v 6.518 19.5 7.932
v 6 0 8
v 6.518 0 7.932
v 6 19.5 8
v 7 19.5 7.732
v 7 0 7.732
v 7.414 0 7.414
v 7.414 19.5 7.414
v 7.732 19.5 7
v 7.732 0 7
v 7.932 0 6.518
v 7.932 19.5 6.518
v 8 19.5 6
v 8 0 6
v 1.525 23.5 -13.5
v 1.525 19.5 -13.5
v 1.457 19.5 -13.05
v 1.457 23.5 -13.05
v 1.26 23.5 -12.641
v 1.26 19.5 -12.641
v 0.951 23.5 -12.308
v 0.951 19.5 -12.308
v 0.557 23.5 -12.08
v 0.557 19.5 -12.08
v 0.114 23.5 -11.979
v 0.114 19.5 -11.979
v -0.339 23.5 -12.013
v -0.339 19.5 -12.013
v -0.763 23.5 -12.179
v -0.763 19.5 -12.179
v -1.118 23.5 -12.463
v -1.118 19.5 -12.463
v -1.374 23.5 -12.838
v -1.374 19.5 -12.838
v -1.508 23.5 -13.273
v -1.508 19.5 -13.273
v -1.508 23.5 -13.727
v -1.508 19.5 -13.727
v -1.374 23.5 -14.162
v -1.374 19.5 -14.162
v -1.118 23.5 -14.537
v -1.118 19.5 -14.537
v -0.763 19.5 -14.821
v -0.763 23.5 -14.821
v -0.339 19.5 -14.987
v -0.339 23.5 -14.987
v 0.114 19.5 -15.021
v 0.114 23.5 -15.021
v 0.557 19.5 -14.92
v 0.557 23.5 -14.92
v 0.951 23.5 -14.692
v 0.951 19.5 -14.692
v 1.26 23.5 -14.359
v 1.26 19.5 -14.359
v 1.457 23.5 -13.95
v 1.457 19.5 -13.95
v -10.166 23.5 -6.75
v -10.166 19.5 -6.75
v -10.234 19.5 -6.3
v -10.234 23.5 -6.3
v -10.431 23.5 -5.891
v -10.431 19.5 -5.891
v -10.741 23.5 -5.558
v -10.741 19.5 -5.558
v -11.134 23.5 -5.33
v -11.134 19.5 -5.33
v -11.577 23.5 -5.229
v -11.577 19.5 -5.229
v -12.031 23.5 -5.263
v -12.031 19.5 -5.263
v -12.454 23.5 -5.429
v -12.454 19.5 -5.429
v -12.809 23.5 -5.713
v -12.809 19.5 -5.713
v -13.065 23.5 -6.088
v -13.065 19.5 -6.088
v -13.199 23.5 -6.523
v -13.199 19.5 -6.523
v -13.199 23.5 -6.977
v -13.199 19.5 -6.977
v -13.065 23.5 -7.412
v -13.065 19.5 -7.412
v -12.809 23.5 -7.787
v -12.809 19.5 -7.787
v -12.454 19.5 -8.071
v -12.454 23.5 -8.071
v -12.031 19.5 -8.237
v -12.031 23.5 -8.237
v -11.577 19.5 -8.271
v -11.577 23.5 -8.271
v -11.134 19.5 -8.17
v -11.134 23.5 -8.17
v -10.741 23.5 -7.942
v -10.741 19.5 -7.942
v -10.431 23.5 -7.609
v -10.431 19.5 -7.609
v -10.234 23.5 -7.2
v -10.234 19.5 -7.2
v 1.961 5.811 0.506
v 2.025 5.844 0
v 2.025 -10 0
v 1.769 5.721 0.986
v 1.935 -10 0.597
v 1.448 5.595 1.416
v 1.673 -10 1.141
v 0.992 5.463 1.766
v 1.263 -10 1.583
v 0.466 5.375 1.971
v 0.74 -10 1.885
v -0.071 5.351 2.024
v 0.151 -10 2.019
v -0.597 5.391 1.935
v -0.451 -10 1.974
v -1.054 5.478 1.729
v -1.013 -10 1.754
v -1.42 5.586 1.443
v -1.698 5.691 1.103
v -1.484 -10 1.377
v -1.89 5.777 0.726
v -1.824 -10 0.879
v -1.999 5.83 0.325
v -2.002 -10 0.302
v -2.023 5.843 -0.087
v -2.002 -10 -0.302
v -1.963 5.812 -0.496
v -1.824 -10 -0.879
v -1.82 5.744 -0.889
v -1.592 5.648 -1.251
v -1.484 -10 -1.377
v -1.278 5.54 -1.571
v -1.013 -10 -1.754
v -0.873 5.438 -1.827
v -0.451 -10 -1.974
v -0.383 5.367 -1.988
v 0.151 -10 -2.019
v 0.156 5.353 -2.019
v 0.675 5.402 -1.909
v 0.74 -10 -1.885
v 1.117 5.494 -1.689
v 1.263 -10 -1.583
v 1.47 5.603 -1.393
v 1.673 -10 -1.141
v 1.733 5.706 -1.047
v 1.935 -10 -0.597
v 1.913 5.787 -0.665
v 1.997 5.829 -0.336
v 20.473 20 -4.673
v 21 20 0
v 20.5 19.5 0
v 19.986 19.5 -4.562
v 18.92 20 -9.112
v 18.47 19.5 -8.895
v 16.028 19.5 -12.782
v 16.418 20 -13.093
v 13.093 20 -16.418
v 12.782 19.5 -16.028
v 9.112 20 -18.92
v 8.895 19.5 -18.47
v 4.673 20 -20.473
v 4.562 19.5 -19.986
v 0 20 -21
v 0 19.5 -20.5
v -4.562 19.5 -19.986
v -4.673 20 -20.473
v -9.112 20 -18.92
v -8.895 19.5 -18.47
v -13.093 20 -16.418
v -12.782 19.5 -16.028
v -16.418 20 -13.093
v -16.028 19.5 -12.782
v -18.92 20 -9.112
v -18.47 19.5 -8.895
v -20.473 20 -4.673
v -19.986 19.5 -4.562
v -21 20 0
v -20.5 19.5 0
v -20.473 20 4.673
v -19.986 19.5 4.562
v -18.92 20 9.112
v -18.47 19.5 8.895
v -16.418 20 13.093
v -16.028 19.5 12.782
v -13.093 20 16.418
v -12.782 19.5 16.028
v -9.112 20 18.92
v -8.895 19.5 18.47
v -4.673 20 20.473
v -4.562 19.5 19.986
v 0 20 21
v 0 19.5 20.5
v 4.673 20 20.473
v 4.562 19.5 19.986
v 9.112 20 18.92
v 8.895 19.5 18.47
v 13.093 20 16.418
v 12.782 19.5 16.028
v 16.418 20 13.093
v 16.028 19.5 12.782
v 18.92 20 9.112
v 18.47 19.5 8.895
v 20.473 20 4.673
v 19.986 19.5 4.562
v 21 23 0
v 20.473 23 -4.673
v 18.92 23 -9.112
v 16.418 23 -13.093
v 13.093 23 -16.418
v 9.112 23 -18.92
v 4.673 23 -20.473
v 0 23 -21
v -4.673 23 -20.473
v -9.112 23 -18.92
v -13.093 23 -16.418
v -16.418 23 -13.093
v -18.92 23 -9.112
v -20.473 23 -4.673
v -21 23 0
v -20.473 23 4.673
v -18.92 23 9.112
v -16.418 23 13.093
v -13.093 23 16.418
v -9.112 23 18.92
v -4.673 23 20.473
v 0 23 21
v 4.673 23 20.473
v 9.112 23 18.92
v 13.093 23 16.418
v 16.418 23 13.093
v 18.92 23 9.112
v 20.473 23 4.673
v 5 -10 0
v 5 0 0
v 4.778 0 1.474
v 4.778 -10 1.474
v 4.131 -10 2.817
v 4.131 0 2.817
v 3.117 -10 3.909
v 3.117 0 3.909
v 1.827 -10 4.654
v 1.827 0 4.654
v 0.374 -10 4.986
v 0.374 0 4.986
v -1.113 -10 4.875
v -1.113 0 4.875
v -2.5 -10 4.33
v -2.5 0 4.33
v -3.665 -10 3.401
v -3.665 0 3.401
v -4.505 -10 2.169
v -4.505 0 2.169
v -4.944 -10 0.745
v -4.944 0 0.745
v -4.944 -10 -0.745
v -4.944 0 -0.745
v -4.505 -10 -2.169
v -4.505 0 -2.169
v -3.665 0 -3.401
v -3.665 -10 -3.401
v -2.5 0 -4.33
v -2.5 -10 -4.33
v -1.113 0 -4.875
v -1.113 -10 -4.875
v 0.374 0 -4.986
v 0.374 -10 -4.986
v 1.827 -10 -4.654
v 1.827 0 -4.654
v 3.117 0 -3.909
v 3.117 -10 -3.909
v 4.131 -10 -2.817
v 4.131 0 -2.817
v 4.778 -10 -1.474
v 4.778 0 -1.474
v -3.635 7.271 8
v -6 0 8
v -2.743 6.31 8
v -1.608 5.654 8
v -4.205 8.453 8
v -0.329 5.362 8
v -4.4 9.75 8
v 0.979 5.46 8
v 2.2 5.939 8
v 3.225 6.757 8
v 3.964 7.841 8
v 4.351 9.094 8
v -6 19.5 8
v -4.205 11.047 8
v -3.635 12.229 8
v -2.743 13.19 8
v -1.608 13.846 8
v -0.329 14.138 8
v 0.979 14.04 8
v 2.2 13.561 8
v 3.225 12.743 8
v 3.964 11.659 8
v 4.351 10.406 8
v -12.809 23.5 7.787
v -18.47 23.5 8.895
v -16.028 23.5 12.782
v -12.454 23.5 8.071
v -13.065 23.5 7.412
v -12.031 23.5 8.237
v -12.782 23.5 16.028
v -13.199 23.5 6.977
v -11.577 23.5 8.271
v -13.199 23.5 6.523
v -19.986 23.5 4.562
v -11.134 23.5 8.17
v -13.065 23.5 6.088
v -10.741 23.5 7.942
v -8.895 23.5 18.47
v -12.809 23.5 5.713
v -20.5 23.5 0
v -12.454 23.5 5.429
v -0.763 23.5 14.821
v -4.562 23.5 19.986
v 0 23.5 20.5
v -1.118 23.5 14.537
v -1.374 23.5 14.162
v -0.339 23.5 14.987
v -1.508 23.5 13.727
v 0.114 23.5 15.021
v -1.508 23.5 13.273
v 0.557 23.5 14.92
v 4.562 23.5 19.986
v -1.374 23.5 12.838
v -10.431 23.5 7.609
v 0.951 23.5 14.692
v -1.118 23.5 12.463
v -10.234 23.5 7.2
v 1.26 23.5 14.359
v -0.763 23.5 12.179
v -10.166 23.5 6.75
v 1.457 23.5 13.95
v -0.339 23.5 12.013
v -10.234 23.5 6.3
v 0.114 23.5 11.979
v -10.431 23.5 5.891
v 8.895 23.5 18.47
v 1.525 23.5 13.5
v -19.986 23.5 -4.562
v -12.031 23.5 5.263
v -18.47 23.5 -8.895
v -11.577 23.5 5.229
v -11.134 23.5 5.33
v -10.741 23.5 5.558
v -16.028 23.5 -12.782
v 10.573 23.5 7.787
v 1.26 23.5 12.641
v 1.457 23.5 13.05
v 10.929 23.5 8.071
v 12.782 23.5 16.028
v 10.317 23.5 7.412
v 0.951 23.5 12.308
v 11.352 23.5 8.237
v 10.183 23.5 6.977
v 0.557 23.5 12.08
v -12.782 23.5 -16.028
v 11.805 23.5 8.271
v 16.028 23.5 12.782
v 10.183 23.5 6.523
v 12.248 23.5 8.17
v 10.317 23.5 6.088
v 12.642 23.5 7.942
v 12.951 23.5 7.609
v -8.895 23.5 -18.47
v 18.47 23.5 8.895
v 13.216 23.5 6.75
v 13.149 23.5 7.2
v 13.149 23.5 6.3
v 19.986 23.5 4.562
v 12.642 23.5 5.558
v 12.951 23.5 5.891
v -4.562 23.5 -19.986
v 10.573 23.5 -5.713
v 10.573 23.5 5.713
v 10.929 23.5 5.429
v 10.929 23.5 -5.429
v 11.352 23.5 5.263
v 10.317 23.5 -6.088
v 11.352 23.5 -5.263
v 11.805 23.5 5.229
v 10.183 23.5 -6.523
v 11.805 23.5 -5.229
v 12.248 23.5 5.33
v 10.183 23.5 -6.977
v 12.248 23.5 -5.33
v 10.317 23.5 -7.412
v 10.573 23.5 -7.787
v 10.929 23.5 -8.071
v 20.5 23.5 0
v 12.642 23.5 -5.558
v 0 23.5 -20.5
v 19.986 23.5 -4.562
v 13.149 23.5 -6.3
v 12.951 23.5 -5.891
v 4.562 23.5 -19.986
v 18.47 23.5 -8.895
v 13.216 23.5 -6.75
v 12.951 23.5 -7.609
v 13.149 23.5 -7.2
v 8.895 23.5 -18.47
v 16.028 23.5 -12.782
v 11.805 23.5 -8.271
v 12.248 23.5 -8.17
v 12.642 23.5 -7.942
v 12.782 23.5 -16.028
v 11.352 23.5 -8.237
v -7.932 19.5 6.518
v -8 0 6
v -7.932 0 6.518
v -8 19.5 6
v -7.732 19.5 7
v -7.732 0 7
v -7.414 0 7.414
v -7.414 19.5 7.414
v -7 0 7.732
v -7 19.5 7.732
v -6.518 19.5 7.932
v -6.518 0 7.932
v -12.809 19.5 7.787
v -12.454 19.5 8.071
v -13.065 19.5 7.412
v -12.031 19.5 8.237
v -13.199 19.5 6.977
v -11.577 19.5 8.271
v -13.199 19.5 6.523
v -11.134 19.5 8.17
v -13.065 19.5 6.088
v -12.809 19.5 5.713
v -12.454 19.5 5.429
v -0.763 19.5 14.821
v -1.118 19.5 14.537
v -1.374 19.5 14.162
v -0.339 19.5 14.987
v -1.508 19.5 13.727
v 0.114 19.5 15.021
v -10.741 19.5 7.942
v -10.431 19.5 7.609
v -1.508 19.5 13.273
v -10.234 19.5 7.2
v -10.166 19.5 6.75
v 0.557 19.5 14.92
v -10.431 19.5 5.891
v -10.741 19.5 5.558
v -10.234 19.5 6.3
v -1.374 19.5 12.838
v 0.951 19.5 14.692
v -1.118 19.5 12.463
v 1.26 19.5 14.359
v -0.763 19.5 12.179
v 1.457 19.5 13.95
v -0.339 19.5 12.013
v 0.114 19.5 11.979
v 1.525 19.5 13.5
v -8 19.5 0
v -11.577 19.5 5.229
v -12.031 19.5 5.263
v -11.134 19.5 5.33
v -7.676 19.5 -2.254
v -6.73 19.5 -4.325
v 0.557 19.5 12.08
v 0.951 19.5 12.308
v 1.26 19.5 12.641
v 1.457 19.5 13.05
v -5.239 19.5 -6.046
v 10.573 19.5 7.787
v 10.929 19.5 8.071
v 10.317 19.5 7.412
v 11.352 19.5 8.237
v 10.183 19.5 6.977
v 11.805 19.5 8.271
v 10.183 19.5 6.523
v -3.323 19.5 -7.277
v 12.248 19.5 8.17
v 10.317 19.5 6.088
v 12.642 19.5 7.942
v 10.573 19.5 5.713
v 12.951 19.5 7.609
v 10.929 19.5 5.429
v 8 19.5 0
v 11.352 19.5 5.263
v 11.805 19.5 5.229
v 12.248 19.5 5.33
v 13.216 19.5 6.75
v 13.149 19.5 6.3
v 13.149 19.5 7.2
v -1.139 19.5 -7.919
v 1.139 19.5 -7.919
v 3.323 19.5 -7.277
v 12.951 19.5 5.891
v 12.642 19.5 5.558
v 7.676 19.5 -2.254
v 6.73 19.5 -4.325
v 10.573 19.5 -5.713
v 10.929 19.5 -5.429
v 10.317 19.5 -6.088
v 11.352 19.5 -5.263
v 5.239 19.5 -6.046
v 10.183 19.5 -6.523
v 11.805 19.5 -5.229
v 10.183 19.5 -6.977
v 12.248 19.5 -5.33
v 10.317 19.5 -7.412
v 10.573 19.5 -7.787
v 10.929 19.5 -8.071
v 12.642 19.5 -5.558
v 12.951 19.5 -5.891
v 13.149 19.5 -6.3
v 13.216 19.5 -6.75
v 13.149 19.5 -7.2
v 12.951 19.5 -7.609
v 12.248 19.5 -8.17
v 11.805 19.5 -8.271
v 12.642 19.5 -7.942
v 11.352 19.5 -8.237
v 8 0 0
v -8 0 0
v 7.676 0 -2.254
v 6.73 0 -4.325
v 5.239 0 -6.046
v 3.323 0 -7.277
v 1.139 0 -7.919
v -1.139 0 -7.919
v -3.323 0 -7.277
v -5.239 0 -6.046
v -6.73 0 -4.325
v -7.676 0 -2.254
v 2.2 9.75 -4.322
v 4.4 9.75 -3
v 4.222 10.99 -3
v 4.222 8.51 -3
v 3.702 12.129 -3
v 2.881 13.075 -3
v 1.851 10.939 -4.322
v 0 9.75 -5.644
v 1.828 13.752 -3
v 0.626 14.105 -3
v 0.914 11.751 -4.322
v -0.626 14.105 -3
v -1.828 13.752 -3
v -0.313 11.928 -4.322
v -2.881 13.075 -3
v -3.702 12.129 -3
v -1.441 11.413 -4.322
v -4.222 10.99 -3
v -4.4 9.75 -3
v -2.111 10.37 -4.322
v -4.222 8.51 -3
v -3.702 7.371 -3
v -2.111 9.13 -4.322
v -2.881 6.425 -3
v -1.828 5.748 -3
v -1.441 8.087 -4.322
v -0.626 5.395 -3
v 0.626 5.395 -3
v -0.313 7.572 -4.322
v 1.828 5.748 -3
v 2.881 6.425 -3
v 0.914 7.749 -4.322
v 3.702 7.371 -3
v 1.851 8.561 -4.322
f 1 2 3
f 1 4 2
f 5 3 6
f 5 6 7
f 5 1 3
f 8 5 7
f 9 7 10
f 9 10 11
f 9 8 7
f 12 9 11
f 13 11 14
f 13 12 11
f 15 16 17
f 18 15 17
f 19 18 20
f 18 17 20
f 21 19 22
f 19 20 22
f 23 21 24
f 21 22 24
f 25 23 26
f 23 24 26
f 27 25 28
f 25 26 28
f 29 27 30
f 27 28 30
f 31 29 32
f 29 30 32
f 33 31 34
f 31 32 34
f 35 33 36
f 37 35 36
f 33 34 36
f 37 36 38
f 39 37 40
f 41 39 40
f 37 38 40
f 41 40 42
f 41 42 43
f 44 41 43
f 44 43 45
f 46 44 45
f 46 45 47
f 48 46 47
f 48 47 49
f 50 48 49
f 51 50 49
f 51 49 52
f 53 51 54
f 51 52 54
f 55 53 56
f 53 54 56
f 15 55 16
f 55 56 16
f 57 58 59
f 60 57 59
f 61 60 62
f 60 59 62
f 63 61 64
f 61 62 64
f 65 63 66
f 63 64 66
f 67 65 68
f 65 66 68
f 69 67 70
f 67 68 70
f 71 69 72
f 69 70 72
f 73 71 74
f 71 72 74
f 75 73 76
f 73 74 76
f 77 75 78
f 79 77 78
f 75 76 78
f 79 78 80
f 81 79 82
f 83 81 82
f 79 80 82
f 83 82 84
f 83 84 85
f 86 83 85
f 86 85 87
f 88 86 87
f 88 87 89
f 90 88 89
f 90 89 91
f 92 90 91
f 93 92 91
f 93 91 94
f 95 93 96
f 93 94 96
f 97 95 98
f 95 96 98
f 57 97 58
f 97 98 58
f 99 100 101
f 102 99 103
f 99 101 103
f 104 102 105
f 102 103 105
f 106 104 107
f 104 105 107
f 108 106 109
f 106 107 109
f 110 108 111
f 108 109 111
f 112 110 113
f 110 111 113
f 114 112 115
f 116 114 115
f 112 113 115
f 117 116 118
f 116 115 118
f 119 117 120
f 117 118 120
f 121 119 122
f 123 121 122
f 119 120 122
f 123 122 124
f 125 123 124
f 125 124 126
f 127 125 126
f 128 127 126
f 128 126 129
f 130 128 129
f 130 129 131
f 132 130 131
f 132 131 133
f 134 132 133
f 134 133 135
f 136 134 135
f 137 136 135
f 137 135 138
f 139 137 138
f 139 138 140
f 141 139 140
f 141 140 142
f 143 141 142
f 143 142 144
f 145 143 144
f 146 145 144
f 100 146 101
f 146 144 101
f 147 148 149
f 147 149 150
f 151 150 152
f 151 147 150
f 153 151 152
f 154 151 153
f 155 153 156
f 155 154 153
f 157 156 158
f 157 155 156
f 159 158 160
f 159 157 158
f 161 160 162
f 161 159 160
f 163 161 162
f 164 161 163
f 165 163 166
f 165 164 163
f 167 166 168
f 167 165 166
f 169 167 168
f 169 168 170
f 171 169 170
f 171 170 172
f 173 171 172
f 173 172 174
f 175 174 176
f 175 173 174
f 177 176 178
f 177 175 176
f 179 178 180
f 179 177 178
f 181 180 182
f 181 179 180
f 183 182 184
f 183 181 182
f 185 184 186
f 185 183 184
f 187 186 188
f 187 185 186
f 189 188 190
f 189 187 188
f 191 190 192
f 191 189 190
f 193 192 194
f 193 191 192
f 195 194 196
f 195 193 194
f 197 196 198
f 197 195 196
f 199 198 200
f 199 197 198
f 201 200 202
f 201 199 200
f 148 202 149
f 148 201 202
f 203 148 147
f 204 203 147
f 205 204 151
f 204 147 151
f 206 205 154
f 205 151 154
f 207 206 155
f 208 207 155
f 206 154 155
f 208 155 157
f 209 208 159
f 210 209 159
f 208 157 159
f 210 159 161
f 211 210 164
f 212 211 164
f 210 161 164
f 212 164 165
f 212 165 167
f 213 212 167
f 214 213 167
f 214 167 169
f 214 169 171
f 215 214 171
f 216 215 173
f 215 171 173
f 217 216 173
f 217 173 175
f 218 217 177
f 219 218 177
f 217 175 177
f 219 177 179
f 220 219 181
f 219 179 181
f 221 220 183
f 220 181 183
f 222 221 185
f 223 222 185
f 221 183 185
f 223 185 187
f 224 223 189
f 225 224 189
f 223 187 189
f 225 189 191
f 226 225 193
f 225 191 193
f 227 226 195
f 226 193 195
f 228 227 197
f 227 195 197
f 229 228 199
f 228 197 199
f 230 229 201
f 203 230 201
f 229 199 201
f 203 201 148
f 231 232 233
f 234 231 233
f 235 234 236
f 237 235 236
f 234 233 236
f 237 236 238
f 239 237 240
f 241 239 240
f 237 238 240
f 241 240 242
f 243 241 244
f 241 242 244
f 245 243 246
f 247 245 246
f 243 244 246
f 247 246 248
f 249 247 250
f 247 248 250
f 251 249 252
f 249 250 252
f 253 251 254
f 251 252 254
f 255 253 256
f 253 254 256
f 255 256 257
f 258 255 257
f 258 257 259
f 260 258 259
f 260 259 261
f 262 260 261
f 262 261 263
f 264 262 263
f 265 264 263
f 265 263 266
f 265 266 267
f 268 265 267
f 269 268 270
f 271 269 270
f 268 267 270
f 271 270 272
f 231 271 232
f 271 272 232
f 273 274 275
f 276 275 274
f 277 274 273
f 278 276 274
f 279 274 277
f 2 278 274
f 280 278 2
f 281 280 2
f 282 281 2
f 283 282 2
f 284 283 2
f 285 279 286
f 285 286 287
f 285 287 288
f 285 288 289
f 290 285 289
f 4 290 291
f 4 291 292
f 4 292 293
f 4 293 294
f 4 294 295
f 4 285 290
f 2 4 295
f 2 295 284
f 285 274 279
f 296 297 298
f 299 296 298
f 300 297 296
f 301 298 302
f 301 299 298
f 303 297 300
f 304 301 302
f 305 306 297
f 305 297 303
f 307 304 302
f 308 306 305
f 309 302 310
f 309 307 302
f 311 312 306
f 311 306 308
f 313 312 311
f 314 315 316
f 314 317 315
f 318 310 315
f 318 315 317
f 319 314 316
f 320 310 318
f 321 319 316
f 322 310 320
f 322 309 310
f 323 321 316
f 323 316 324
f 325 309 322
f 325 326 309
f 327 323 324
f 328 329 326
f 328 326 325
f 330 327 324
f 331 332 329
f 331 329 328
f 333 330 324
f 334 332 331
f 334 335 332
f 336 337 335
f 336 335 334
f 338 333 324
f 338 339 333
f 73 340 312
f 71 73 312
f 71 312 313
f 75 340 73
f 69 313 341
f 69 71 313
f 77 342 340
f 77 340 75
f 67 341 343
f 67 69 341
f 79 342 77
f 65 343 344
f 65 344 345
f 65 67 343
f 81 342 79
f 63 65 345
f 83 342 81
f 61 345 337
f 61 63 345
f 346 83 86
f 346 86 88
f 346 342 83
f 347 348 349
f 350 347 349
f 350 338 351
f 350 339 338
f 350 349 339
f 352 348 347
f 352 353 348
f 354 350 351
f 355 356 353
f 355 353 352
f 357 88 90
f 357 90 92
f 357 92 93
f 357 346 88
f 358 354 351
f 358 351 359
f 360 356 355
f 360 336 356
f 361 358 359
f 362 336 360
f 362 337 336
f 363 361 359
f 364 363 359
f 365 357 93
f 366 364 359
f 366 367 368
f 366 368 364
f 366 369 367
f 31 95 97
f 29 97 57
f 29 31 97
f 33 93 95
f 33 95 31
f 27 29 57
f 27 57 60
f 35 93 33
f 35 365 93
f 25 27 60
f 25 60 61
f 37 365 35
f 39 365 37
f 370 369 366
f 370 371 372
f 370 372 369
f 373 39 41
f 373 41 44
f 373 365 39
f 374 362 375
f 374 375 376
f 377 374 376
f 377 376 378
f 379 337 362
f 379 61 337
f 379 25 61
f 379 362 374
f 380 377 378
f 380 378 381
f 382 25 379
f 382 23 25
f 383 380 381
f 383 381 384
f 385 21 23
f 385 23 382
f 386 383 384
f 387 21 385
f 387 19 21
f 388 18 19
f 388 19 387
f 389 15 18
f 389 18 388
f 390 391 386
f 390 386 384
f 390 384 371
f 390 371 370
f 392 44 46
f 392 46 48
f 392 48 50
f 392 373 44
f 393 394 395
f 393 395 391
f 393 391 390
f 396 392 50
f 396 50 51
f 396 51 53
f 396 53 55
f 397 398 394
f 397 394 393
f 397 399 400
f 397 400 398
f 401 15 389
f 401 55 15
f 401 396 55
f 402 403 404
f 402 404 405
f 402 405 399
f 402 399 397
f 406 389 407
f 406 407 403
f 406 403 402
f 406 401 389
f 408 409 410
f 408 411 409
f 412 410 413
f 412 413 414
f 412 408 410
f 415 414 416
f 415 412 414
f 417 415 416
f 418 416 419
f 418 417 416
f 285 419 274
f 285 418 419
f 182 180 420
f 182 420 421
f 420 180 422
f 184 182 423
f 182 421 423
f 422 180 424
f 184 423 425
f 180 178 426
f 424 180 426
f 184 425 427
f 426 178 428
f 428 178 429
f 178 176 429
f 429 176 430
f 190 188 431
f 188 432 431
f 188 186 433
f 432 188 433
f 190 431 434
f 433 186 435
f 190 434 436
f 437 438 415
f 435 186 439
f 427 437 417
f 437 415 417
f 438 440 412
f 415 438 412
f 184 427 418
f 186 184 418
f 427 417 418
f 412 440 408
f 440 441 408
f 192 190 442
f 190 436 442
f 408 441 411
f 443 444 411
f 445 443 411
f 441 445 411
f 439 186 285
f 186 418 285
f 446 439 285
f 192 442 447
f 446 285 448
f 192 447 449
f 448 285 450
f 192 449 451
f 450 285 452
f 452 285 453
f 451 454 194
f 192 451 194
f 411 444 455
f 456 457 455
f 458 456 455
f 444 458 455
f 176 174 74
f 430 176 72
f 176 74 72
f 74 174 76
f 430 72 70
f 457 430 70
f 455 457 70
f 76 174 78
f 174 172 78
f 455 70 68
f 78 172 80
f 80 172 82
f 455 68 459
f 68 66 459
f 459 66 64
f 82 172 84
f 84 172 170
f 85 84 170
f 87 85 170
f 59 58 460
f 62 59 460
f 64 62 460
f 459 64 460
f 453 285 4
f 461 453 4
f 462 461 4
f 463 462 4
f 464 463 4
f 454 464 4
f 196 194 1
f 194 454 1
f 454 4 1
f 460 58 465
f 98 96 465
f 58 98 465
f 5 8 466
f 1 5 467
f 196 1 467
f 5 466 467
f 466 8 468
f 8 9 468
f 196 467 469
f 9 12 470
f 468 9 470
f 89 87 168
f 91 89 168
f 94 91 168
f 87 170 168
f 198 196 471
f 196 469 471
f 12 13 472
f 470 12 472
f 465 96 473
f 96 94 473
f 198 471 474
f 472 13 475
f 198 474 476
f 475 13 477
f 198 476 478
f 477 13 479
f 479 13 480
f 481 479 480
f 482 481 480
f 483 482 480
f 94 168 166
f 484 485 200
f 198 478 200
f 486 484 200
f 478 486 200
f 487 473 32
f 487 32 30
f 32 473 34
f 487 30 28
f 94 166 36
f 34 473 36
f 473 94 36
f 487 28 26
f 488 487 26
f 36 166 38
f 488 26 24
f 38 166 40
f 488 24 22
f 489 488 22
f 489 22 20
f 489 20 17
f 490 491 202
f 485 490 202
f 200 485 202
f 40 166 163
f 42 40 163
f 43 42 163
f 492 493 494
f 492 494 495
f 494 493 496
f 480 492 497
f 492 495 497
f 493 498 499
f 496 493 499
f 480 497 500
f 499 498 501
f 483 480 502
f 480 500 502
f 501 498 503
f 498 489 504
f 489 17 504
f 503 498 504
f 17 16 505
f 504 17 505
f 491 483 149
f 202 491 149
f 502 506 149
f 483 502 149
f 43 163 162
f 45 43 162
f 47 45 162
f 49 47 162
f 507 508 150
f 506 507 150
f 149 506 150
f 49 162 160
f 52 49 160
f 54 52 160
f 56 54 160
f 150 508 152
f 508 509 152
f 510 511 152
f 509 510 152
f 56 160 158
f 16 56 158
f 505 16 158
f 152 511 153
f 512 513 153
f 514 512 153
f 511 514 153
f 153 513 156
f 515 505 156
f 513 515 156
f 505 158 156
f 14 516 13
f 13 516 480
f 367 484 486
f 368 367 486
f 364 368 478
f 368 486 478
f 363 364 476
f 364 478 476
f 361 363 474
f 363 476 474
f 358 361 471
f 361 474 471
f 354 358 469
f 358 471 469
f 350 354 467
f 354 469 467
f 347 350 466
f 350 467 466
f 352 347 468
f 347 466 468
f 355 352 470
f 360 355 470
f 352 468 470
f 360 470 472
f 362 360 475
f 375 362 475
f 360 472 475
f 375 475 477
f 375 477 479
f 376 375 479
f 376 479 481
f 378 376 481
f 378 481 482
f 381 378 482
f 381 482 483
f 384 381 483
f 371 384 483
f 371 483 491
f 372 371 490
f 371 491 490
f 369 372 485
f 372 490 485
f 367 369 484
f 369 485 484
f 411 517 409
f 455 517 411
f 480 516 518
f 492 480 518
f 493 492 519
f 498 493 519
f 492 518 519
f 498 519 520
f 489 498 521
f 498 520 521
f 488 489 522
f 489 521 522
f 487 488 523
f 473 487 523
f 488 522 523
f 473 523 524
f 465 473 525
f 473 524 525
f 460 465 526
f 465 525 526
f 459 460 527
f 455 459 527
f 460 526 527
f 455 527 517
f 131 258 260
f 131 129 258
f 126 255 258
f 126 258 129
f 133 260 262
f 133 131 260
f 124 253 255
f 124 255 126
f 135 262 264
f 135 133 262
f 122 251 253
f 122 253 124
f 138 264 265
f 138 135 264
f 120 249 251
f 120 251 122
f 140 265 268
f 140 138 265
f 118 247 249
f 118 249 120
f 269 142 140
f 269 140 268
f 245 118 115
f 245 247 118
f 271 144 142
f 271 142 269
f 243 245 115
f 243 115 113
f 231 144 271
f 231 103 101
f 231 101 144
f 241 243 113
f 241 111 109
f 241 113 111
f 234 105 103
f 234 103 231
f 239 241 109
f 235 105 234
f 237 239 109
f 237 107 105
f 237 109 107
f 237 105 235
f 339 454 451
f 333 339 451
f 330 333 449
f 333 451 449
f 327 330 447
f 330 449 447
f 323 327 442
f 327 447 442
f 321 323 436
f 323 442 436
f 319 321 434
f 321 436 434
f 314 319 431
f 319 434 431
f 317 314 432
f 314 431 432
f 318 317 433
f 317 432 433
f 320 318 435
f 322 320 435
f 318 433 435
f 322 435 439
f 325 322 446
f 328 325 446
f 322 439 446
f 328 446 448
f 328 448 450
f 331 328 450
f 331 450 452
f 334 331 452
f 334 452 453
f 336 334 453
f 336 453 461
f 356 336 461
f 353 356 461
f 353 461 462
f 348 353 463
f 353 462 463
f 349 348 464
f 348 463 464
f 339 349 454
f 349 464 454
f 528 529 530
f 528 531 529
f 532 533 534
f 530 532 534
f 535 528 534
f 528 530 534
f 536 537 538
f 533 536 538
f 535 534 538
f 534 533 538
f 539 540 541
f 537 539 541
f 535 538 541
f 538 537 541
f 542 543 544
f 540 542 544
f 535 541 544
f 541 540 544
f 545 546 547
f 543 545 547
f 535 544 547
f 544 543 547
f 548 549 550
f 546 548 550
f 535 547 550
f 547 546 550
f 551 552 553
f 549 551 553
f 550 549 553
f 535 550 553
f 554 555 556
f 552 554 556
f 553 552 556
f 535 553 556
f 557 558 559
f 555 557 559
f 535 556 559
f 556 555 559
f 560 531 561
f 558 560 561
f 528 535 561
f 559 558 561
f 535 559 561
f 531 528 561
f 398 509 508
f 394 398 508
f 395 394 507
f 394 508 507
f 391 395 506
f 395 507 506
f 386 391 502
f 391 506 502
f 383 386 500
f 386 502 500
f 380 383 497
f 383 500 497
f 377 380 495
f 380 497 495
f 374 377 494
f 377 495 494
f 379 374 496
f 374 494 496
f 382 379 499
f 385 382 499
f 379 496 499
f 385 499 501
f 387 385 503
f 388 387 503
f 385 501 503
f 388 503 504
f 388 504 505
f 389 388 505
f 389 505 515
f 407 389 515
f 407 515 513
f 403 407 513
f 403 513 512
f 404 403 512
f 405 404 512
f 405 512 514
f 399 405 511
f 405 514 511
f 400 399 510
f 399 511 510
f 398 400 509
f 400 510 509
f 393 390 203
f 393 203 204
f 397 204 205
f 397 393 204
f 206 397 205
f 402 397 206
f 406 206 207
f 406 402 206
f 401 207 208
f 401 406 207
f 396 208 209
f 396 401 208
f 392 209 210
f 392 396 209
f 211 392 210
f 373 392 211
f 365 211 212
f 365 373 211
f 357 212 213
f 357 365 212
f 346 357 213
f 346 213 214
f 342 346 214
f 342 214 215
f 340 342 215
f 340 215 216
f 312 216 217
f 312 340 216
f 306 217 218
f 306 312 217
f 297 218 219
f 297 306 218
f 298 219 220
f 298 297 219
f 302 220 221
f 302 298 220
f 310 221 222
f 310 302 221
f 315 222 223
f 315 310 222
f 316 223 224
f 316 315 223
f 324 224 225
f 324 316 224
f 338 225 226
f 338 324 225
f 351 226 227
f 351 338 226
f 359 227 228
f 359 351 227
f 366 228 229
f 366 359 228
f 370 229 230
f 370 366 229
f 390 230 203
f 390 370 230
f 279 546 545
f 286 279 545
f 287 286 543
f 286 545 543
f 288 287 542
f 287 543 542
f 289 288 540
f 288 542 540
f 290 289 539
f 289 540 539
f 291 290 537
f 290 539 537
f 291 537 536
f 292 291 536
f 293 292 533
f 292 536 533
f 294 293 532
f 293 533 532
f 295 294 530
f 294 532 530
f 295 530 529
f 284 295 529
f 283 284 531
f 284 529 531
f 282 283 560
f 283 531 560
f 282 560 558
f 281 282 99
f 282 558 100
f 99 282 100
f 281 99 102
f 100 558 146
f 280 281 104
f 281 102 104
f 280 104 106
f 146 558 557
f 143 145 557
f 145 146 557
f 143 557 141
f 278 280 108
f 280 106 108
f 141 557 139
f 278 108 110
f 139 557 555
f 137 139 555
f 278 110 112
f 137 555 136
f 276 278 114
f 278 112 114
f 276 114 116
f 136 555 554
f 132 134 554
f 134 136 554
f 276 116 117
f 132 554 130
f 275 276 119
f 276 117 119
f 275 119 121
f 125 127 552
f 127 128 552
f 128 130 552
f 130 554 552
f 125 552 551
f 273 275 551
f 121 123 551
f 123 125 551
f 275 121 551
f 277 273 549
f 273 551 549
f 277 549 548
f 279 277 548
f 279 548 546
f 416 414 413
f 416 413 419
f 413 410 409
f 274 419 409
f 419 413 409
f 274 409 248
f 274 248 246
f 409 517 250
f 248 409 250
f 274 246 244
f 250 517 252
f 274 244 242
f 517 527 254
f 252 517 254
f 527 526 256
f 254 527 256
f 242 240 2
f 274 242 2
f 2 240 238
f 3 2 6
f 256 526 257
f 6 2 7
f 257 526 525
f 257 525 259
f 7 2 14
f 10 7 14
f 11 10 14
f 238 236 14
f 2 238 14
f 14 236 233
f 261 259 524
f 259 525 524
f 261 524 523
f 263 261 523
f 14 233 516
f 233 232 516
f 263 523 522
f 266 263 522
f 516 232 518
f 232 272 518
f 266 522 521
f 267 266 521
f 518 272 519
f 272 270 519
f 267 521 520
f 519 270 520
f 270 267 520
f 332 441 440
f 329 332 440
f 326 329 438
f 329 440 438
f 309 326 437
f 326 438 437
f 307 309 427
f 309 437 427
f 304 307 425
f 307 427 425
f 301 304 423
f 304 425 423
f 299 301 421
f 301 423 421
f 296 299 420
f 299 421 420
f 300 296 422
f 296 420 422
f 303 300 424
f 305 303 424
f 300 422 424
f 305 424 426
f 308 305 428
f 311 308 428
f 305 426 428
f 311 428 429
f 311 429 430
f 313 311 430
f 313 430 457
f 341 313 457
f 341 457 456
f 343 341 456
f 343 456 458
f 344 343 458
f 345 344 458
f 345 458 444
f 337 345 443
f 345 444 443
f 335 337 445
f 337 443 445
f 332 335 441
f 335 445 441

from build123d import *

# Parameters (mm, degrees)
SKETCH_1_R               = 8
EXTRUDE_1_DEPTH          = 19.5
SKETCH_2_R               = 21
EXTRUDE_2_DEPTH          = 4
SKETCH_3_R               = 1.525
CUT_EXTRUDE_1_DEPTH      = 4
SKETCH_5_W               = 16
SKETCH_5_H               = 19.5
EXTRUDE_3_DEPTH          = 8
SKETCH_8_R               = 5
EXTRUDE_4_DEPTH          = 10
HOLE_WIZARD_G1_8_1_D     = 8.8
HOLE_WIZARD_G1_8_1_DEPTH = 11
HOLE_WIZARD_G1_8_1_TIP   = 2.643786724
CUT_EXTRUDE_4_REACH      = 35.5
SKETCH_9_R               = 2.025
FILLET_1_R               = 2
CHAMFER_1_SIZE           = 0.5


with BuildPart() as part:
    # 草图1 → 凸台-拉伸1 (new body)
    with BuildSketch(Plane(origin=(0, 0, 0), x_dir=(1, 0, 0), z_dir=(0, 1, 0))):
        Circle(SKETCH_1_R)
    extrude(amount=EXTRUDE_1_DEPTH)

    # 草图2 → 凸台-拉伸2 (add)
    with BuildSketch(Plane(origin=(0, 19.5, 0), x_dir=(1, 0, 0), z_dir=(0, 1, 0))):
        Circle(SKETCH_2_R)
    extrude(amount=EXTRUDE_2_DEPTH)

    # 草图3 → 切除-拉伸1 (cut)
    with BuildSketch(Plane.XZ.offset(-19.5)):
        with Locations((0, -13.5)):
            Circle(SKETCH_3_R)
        with Locations((-11.691342951, -6.75)):
            Circle(SKETCH_3_R)
        with Locations((-11.691342951, 6.75)):
            Circle(SKETCH_3_R)
        with Locations((0, 13.5)):
            Circle(SKETCH_3_R)
        with Locations((11.691342951, 6.75)):
            Circle(SKETCH_3_R)
        with Locations((11.691342951, -6.75)):
            Circle(SKETCH_3_R)
    extrude(amount=-CUT_EXTRUDE_1_DEPTH, mode=Mode.SUBTRACT)

    # 草图5 → 凸台-拉伸3 (add)
    with BuildSketch(Plane.XY):
        with Locations((0, 9.75)):
            Rectangle(SKETCH_5_W, SKETCH_5_H)
    extrude(amount=EXTRUDE_3_DEPTH)

    # 草图8 → 凸台-拉伸4 (add)
    with BuildSketch(Plane.XZ):
        Circle(SKETCH_8_R)
    extrude(amount=EXTRUDE_4_DEPTH)

    # G1/8 螺纹孔1
    with Locations(Plane(origin=(0, 9.75, 8), x_dir=(1, 0, 0), z_dir=(0, 0, 1))):
        with Locations((0, 0)):
            Hole(HOLE_WIZARD_G1_8_1_D / 2, depth=HOLE_WIZARD_G1_8_1_DEPTH)
            with Locations((0, 0, -(HOLE_WIZARD_G1_8_1_DEPTH + HOLE_WIZARD_G1_8_1_TIP / 2))):  # 118° drill point
                Cone(0, HOLE_WIZARD_G1_8_1_D / 2, HOLE_WIZARD_G1_8_1_TIP, mode=Mode.SUBTRACT)

    # 草图9 → 切除-拉伸4 (cut, up to next)
    with BuildSketch(Plane.XZ.offset(10), mode=Mode.PRIVATE) as cut_extrude_4_sk1:
        Circle(SKETCH_9_R)
    cut_extrude_4_tool1 = extrude(cut_extrude_4_sk1.sketch, amount=-CUT_EXTRUDE_4_REACH, mode=Mode.PRIVATE) & part.part
    add(cut_extrude_4_tool1.solids().sort_by_distance((0, -10, 0))[0], mode=Mode.SUBTRACT)

    # 圆角1
    fillet_1_edges = [part.edges().sort_by_distance(p)[0] for p in [
        (8, 9.75, 8),
        (-8, 9.75, 8),
    ]]
    fillet(fillet_1_edges, radius=FILLET_1_R)

    # 倒角1
    chamfer_1_edges = [part.edges().sort_by_distance(p)[0] for p in [
        (-21, 19.5, 0),
        (-21, 23.5, 0),
    ]]
    chamfer(chamfer_1_edges, length=CHAMFER_1_SIZE)


solid = part.part
